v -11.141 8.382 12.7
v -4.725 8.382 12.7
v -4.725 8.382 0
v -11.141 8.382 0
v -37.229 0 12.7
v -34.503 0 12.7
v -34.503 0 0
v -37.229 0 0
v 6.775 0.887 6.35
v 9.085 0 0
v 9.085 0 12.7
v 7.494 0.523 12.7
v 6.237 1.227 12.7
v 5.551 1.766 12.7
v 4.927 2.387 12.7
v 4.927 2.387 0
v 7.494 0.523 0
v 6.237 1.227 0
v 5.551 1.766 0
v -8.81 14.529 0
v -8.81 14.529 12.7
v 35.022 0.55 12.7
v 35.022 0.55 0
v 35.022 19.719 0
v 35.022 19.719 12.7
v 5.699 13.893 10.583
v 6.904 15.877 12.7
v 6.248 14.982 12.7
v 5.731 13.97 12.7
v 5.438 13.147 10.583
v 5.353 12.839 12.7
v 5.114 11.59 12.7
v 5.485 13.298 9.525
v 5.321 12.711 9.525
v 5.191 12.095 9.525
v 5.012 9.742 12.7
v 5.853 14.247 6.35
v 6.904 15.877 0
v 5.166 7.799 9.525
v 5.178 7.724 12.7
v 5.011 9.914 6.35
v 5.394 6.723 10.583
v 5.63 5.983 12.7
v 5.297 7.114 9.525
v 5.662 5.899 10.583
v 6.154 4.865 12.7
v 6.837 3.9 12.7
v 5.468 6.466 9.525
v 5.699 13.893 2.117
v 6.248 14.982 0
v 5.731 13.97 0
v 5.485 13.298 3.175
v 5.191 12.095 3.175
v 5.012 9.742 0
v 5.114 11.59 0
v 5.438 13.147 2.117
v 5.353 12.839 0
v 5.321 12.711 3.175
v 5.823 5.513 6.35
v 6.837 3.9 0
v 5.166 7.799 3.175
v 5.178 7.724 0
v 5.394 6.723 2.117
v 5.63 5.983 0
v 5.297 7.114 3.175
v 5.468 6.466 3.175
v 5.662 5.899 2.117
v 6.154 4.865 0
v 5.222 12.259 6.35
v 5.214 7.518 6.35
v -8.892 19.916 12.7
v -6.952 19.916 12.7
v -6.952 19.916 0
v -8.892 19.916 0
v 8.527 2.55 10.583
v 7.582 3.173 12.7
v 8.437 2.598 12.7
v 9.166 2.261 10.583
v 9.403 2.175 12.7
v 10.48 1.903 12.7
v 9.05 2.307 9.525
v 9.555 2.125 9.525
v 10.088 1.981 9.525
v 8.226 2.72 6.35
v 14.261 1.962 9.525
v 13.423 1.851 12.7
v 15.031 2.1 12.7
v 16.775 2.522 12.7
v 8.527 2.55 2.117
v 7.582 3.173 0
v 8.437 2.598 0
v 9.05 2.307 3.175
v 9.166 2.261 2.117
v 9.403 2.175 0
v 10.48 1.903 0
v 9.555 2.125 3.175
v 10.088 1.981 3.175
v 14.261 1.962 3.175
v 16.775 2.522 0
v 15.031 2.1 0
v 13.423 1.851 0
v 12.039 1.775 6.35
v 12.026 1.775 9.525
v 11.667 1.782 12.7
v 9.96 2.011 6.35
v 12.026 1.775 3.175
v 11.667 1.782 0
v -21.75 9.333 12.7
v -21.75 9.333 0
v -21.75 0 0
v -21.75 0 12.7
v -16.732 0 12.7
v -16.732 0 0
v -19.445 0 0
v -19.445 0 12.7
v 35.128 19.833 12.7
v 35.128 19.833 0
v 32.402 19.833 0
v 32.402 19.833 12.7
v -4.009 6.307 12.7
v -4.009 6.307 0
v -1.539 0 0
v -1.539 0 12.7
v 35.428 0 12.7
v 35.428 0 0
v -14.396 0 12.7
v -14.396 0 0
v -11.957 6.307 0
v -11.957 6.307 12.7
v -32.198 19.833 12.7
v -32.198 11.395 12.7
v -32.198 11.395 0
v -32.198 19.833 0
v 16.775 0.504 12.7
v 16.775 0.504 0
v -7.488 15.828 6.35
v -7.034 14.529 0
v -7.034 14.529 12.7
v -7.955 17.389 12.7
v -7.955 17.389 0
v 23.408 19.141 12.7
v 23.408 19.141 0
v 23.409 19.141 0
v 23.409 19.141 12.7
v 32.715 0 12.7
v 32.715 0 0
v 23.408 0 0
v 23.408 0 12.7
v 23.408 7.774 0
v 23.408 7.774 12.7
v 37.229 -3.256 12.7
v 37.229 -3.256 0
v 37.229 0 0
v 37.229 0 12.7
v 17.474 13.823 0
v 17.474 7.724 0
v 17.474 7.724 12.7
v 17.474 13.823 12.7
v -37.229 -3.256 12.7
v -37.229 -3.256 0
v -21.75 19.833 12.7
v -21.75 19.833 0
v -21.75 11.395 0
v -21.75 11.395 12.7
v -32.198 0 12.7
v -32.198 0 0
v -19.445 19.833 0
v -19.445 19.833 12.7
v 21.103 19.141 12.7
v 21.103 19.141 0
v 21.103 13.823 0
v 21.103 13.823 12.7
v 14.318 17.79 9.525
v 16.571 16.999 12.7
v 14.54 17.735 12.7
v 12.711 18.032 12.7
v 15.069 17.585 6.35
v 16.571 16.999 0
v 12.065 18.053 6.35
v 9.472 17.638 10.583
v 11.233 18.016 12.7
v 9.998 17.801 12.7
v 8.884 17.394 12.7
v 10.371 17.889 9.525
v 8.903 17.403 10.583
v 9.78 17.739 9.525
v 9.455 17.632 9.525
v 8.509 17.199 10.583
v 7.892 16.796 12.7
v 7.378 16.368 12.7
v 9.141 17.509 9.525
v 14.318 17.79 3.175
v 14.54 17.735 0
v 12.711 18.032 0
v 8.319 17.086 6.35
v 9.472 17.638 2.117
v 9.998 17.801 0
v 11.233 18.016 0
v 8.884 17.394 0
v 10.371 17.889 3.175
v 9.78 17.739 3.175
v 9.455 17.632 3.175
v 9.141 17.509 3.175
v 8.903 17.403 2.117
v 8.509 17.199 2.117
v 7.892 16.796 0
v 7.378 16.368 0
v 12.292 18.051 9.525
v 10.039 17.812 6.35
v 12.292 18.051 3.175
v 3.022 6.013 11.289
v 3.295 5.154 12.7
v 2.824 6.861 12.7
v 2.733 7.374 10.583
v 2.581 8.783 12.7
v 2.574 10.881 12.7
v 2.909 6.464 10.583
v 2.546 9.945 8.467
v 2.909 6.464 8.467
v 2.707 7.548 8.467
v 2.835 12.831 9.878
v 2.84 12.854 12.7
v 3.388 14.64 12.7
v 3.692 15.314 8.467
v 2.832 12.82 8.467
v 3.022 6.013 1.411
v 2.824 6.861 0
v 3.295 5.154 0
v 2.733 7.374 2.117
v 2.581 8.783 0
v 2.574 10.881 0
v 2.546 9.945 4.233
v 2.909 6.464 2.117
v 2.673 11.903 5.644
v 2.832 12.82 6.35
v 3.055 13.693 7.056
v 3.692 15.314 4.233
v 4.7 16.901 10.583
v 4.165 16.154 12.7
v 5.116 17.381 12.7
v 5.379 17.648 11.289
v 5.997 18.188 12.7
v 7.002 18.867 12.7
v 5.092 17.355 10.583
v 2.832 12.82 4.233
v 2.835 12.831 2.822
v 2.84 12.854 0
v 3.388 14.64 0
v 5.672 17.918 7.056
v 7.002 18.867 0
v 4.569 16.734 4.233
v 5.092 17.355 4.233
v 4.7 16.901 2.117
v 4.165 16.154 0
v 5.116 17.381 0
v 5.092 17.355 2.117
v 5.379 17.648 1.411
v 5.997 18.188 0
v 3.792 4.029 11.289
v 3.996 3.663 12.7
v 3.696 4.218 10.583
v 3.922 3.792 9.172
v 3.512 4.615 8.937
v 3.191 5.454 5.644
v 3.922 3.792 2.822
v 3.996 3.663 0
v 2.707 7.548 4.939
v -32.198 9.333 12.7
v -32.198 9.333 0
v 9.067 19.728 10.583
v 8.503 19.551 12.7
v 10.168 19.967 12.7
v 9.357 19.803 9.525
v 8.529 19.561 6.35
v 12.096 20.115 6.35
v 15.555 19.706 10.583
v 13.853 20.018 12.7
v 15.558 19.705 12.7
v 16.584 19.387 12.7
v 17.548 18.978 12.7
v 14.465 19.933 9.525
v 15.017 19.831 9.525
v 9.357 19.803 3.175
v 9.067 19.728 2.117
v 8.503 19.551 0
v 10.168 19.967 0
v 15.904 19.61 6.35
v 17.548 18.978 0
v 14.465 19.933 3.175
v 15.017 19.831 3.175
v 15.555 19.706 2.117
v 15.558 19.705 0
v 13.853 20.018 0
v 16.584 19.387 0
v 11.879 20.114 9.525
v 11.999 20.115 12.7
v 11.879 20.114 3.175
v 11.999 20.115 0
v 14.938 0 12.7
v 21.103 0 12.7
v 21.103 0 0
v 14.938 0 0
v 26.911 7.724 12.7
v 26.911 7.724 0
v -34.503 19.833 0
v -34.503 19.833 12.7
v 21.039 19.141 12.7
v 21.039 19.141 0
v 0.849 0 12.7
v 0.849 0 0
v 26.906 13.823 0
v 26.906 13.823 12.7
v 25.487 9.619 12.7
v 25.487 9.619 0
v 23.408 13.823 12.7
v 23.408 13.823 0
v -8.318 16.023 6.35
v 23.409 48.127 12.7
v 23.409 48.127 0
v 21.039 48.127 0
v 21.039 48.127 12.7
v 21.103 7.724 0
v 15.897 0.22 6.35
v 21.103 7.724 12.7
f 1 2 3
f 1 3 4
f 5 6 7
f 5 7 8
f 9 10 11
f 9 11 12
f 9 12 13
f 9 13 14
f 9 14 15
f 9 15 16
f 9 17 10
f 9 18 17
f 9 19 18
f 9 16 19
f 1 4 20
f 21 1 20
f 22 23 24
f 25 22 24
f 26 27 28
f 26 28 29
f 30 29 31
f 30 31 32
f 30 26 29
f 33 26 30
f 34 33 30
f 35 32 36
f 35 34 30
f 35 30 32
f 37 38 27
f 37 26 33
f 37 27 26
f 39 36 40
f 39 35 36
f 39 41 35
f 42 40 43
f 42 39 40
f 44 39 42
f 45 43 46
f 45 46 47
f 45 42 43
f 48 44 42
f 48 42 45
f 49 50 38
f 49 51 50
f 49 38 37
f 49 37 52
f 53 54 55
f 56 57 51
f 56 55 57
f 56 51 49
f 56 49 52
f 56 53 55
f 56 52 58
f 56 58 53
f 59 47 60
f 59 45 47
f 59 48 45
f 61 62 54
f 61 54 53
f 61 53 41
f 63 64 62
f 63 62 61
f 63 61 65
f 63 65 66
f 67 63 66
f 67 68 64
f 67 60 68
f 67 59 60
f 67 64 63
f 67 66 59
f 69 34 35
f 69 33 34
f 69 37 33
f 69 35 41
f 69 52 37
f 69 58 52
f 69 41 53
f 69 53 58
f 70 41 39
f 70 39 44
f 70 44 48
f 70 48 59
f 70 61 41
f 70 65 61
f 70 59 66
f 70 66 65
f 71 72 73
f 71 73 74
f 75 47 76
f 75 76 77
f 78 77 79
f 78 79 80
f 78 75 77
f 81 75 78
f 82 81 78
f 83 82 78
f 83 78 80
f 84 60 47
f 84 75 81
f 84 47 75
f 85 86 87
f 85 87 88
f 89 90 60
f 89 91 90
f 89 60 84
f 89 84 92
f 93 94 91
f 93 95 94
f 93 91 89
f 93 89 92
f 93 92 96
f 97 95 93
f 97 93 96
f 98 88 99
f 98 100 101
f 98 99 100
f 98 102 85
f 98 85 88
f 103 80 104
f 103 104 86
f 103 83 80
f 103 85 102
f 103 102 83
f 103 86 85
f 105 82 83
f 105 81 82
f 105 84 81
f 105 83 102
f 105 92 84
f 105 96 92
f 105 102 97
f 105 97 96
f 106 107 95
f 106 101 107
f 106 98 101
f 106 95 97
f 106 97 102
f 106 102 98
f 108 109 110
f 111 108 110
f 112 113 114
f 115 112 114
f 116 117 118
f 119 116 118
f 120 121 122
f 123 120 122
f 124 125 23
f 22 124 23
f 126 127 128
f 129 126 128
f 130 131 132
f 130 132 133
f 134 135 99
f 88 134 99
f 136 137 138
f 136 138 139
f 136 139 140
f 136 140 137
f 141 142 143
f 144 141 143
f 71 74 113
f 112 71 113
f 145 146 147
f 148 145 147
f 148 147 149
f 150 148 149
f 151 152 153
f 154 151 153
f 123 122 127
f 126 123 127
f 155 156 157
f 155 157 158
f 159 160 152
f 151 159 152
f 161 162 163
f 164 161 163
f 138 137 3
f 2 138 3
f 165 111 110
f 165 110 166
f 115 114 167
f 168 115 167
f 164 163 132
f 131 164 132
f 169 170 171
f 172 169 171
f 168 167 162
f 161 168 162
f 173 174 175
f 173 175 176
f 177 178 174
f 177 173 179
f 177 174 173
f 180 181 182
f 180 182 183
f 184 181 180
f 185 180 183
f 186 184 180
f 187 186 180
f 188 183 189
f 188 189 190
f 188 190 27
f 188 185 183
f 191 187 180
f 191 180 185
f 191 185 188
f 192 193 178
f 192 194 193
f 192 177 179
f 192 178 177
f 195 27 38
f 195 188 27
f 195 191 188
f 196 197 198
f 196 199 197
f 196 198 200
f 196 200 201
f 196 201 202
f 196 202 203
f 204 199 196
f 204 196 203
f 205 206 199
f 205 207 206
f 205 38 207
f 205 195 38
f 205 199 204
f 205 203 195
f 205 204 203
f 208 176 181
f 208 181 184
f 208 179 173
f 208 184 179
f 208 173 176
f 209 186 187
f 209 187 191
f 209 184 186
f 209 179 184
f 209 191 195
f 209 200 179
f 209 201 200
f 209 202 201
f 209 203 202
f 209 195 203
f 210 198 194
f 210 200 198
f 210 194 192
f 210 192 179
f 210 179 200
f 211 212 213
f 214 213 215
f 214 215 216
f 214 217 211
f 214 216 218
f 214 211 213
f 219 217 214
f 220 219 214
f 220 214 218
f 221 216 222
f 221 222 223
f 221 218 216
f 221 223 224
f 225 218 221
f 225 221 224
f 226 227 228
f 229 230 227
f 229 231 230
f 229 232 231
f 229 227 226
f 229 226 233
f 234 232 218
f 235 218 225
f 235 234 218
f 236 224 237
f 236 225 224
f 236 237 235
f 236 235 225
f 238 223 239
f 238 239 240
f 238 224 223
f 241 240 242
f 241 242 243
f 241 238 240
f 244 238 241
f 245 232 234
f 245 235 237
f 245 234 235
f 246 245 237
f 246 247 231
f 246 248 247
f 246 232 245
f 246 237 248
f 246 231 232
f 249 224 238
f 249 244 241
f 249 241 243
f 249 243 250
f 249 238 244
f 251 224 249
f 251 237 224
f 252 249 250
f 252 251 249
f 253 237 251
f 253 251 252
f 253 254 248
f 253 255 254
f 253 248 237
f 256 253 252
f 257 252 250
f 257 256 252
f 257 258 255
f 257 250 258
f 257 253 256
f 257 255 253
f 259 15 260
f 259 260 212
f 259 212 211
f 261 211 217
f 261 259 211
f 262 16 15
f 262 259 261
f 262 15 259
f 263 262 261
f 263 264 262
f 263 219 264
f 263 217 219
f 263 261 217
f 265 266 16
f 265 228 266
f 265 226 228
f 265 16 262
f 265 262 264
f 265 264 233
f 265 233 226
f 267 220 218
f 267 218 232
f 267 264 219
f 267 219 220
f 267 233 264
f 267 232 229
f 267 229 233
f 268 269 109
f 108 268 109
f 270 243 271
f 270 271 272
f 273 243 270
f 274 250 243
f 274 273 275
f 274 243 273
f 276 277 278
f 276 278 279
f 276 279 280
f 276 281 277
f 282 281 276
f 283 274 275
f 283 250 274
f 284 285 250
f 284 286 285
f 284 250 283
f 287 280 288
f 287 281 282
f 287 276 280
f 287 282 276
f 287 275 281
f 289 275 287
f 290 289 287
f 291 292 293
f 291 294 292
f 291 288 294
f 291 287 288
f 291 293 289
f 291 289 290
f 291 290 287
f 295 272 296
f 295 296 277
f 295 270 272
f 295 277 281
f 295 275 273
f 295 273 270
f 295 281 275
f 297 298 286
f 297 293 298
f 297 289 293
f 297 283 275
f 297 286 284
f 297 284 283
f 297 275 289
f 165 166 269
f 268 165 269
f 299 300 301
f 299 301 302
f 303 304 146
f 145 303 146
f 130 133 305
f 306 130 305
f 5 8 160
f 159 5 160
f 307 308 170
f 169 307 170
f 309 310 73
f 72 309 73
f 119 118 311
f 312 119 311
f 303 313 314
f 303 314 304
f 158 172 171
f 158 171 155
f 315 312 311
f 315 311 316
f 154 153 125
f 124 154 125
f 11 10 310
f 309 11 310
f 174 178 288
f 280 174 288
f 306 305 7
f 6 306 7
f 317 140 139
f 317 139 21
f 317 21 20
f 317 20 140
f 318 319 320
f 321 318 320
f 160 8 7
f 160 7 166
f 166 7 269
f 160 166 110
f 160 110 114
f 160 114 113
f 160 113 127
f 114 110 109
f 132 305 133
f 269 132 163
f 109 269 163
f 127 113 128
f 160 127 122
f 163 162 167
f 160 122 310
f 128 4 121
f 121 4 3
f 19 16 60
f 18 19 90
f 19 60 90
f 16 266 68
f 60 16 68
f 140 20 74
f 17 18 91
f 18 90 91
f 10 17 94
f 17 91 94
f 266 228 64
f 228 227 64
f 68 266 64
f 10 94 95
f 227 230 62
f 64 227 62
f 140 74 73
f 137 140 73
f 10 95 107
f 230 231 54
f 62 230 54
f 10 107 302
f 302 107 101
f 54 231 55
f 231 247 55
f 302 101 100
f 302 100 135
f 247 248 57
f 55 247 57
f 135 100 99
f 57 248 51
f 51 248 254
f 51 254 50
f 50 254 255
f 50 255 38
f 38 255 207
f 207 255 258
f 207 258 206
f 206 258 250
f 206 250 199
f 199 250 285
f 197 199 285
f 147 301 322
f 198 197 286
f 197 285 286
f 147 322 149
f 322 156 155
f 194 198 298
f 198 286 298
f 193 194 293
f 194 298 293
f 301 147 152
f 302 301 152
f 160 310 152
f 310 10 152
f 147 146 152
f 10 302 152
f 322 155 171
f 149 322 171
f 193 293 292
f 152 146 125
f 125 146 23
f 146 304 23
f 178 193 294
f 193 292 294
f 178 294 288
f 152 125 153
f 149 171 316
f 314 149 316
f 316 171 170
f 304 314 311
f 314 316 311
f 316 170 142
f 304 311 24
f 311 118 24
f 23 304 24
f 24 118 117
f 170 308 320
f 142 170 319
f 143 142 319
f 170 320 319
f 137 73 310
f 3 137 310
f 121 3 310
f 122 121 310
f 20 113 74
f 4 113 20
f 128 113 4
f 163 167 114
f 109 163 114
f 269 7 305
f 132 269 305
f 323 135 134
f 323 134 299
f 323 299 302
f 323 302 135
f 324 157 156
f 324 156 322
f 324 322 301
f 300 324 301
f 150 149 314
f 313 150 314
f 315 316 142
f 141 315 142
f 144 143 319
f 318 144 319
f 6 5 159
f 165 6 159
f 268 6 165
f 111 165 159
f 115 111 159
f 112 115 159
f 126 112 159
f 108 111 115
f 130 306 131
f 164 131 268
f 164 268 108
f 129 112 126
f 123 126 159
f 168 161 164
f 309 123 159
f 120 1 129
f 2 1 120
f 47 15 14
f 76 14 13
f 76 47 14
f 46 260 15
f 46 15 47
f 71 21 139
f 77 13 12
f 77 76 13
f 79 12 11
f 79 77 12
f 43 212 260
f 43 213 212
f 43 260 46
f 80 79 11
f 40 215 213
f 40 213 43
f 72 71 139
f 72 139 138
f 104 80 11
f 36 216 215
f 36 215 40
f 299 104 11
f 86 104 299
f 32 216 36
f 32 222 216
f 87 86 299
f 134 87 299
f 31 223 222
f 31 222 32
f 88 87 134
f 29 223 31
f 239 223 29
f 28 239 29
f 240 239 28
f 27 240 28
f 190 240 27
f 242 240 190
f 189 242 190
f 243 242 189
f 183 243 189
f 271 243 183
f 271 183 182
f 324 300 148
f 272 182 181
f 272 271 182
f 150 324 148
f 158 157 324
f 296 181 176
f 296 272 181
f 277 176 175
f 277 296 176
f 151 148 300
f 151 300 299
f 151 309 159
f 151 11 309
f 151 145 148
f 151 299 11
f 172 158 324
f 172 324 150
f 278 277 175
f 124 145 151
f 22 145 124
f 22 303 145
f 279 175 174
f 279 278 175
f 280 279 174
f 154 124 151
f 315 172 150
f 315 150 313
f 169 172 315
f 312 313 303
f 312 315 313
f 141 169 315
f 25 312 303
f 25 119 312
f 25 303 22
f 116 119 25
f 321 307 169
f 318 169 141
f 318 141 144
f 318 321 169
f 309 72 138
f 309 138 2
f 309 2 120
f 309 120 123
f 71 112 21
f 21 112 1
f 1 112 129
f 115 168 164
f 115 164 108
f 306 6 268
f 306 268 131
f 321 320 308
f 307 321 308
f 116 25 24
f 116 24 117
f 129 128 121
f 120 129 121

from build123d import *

# Parameters (mm, degrees)
F0_W     = 2.304975711
F0_H     = 7.7243503183
F0_W_2   = 3.6289574255
F0_H_2   = 6.098523736
F0_H_3   = 5.3181350231
F0_H_4   = 0.6922000066
F1_DEPTH = 12.7


with BuildPart() as f1:
    # F0 (on Top) → F1 (new body)
    with BuildSketch(Plane.XY):
        with BuildLine():
            Line((-34.5030121262, 0), (-37.2290474303, 0))
            Line((-37.2290474303, 0), (-37.2290474303, -3.256221069))
            Line((-37.2290474303, -3.256221069), (37.2290474303, -3.256221069))
            Line((37.2290474303, -3.256221069), (37.2290474303, 0))
            Line((37.2290474303, 0), (35.4276069029, 0))
            Line((35.4276069029, 0), (35.0221842527, 0))
            Line((35.0221842527, 0), (32.7145940604, 0))
            Line((32.7145940604, 0), (23.4078748053, 0))
            Line((23.4078748053, 0), (21.1028990943, 0))
            Line((21.1028990943, 0), (14.9383603664, 0))
            add(Edge.make_bspline(
                [(14.9383603664, 0), (13.4825928521, -0.2734716945), (11.6876593256, -0.2734716945)],
                knots=[0.406741787, 0.406741787, 0.406741787, 1, 1, 1], degree=2))
            add(Edge.make_bspline(
                [(11.6876593256, -0.2734716945), (10.2835431713, -0.2734716945), (9.0848653779, 0)],
                knots=[0, 0, 0, 0.3205826669, 0.3205826669, 0.3205826669], degree=2))
            Line((9.0848653779, 0), (0.8486304171, 0))
            Line((0.8486304171, 0), (-1.5388208843, 0))
            Line((-1.5388208843, 0), (-14.3963313476, 0))
            Line((-14.3963313476, 0), (-16.7316928024, 0))
            Line((-16.7316928024, 0), (-19.444705645, 0))
            Line((-19.444705645, 0), (-21.749681356, 0))
            Line((-21.749681356, 0), (-32.1980364151, 0))
            Line((-32.1980364151, 0), (-34.5030121262, 0))
        make_face()
        Polygon((-34.5030121262, 19.833209084), (-34.5030121262, 0), (-32.1980364151, 0), (-32.1980364151, 9.3327641783), (-21.749681356, 9.3327641783), (-21.749681356, 0), (-19.444705645, 0), (-19.444705645, 19.833209084), (-21.749681356, 19.833209084), (-21.749681356, 11.3946539386), (-32.1980364151, 11.3946539386), (-32.1980364151, 19.833209084), align=None)
        Polygon((35.0221842527, 0), (35.4276069029, 0), (35.0221842527, 0.5496391018), align=None)
        Polygon((-8.8921708927, 19.9156846744), (-16.7316928024, 0), (-14.3963313476, 0), (-11.9567901996, 6.3072122563), (-4.0087477761, 6.3072122563), (-1.5388208843, 0), (0.8486304171, 0), (-6.9518241077, 19.9156846744), align=None)
        with BuildLine():
            Line((-7.0342996981, 14.5287263743), (-4.7249831665, 8.3821244783))
            Line((-4.7249831665, 8.3821244783), (-11.1407159366, 8.3821244783))
            Line((-11.1407159366, 8.3821244783), (-8.8096953023, 14.5287263743))
            add(Edge.make_bspline(
                [(-7.9545536543, 17.3893271155), (-8.2540702721, 16.0870809511), (-8.8096953023, 14.5287263743)],
                knots=[0, 0, 0, 1, 1, 1], degree=2))
            add(Edge.make_bspline(
                [(-7.0342996981, 14.5287263743), (-7.4814042146, 15.6964071017), (-7.9545536543, 17.3893271155)],
                knots=[0, 0, 0, 1, 1, 1], degree=2))
        make_face(mode=Mode.SUBTRACT)
        Polygon((32.7145940604, 0), (35.0221842527, 0), (35.0221842527, 0.5496391018), (27.1540029383, 11.2166802962), (35.0221842527, 19.7187706114), (35.0221842527, 19.833209084), (32.4020549809, 19.833209084), (26.9062852626, 13.8228740543), (27.0378924906, 13.8228740543), (27.0378924906, 7.7243503183), (26.9108741687, 7.7243503183), align=None)
        Polygon((27.1540029383, 11.2166802962), (35.0221842527, 0.5496391018), (35.0221842527, 19.7187706114), align=None)
        Polygon((35.0221842527, 19.833209084), (35.0221842527, 19.7187706114), (35.1280902851, 19.833209084), align=None)
        with Locations((22.2553869498, 3.8621751592)):
            Rectangle(F0_W, F0_H)
        Polygon((25.4871278479, 9.6192583345), (26.9108741687, 7.7243503183), (27.0378924906, 7.7243503183), (27.0378924906, 13.8228740543), (26.9062852626, 13.8228740543), (23.4078748053, 9.9969097222), (23.4078748053, 13.8228740543), (21.1028990943, 13.8228740543), (21.1028990943, 7.7243503183), (23.4078748053, 7.7243503183), (23.4078748053, 7.7744096016), align=None)
        with BuildLine():
            add(Edge.make_bspline(
                [(9.0848653779, 0), (6.544483275, 0.579574096), (4.926831322, 2.3874513014)],
                knots=[0.3205826669, 0.3205826669, 0.3205826669, 1, 1, 1], degree=2))
            Line((9.0848653779, 0), (14.9383603664, 0))
            add(Edge.make_bspline(
                [(16.7751010079, 0.5035351836), (15.9364442822, 0.1874940174), (14.9383603664, 0)],
                knots=[0, 0, 0, 0.406741787, 0.406741787, 0.406741787], degree=2))
            Line((16.7751010079, 0.5035351836), (16.7751010079, 2.5220167384))
            add(Edge.make_bspline(
                [(12.03926579, 1.7753956042), (14.114178012, 1.7753956042), (16.7751010079, 2.5220167384)],
                knots=[0, 0, 0, 1, 1, 1], degree=2))
            add(Edge.make_bspline(
                [(6.8367923632, 3.9002272624), (8.6621074036, 1.7753956042), (12.03926579, 1.7753956042)],
                knots=[0, 0, 0, 1, 1, 1], degree=2))
            add(Edge.make_bspline(
                [(5.0114773227, 9.9144341317), (5.0114773227, 6.0250589207), (6.8367923632, 3.9002272624)],
                knots=[0, 0, 0, 1, 1, 1], degree=2))
            add(Edge.make_bspline(
                [(6.9040750817, 15.8765511545), (5.0114773227, 13.6996296496), (5.0114773227, 9.9144341317)],
                knots=[0, 0, 0, 1, 1, 1], degree=2))
            add(Edge.make_bspline(
                [(12.0653107133, 18.0534726593), (8.7966728406, 18.0534726593), (6.9040750817, 15.8765511545)],
                knots=[0, 0, 0, 1, 1, 1], degree=2))
            add(Edge.make_bspline(
                [(16.5710824422, 16.9986532662), (14.3181965777, 18.0534726593), (12.0653107133, 18.0534726593)],
                knots=[0, 0, 0, 1, 1, 1], degree=2))
            Line((16.5710824422, 16.9986532662), (17.5477670655, 18.9780674361))
            add(Edge.make_bspline(
                [(12.0956964571, 20.1153624196), (15.2124056106, 20.1153624196), (17.5477670655, 18.9780674361)],
                knots=[0, 0, 0, 1, 1, 1], degree=2))
            add(Edge.make_bspline(
                [(7.001743544, 18.8673765121), (9.1656425872, 20.1153624196), (12.0956964571, 20.1153624196)],
                knots=[0, 0, 0, 1, 1, 1], degree=2))
            add(Edge.make_bspline(
                [(3.6918678761, 15.3144148935), (4.8378445008, 17.6193906045), (7.001743544, 18.8673765121)],
                knots=[0, 0, 0, 1, 1, 1], degree=2))
            add(Edge.make_bspline(
                [(2.5458912514, 9.9448198756), (2.5458912514, 13.0094391825), (3.6918678761, 15.3144148935)],
                knots=[0, 0, 0, 1, 1, 1], degree=2))
            add(Edge.make_bspline(
                [(4.926831322, 2.3874513014), (2.5458912514, 5.0483742974), (2.5458912514, 9.9448198756)],
                knots=[0, 0, 0, 1, 1, 1], degree=2))
        make_face()
        with BuildLine():
            Line((14.9383603664, 0), (9.0848653779, 0))
            add(Edge.make_bspline(
                [(11.6876593256, -0.2734716945), (10.2835431713, -0.2734716945), (9.0848653779, 0)],
                knots=[0, 0, 0, 0.3205826669, 0.3205826669, 0.3205826669], degree=2))
            add(Edge.make_bspline(
                [(14.9383603664, 0), (13.4825928521, -0.2734716945), (11.6876593256, -0.2734716945)],
                knots=[0.406741787, 0.406741787, 0.406741787, 1, 1, 1], degree=2))
        make_face()
        with Locations((19.2884203816, 10.7736121863)):
            Rectangle(F0_W_2, F0_H_2)
        Polygon((23.4078748053, 9.9969097222), (26.9062852626, 13.8228740543), (23.4078748053, 13.8228740543), align=None)
        with Locations((22.2553869498, 16.4819415659)):
            Rectangle(F0_W, F0_H_3)
        with Locations((22.2553869498, 19.4871090807)):
            Rectangle(F0_W, F0_H_4)
        Polygon((21.039057523, 19.1410090774), (21.1028990943, 19.1410090774), (21.1028990943, 19.833209084), (23.4078748053, 19.833209084), (23.4078748053, 19.1410090774), (23.4089195728, 19.1410090774), (23.4089195728, 48.1270328164), (21.039057523, 48.1270328164), align=None)
    extrude(amount=F1_DEPTH)


solid = f1.part
